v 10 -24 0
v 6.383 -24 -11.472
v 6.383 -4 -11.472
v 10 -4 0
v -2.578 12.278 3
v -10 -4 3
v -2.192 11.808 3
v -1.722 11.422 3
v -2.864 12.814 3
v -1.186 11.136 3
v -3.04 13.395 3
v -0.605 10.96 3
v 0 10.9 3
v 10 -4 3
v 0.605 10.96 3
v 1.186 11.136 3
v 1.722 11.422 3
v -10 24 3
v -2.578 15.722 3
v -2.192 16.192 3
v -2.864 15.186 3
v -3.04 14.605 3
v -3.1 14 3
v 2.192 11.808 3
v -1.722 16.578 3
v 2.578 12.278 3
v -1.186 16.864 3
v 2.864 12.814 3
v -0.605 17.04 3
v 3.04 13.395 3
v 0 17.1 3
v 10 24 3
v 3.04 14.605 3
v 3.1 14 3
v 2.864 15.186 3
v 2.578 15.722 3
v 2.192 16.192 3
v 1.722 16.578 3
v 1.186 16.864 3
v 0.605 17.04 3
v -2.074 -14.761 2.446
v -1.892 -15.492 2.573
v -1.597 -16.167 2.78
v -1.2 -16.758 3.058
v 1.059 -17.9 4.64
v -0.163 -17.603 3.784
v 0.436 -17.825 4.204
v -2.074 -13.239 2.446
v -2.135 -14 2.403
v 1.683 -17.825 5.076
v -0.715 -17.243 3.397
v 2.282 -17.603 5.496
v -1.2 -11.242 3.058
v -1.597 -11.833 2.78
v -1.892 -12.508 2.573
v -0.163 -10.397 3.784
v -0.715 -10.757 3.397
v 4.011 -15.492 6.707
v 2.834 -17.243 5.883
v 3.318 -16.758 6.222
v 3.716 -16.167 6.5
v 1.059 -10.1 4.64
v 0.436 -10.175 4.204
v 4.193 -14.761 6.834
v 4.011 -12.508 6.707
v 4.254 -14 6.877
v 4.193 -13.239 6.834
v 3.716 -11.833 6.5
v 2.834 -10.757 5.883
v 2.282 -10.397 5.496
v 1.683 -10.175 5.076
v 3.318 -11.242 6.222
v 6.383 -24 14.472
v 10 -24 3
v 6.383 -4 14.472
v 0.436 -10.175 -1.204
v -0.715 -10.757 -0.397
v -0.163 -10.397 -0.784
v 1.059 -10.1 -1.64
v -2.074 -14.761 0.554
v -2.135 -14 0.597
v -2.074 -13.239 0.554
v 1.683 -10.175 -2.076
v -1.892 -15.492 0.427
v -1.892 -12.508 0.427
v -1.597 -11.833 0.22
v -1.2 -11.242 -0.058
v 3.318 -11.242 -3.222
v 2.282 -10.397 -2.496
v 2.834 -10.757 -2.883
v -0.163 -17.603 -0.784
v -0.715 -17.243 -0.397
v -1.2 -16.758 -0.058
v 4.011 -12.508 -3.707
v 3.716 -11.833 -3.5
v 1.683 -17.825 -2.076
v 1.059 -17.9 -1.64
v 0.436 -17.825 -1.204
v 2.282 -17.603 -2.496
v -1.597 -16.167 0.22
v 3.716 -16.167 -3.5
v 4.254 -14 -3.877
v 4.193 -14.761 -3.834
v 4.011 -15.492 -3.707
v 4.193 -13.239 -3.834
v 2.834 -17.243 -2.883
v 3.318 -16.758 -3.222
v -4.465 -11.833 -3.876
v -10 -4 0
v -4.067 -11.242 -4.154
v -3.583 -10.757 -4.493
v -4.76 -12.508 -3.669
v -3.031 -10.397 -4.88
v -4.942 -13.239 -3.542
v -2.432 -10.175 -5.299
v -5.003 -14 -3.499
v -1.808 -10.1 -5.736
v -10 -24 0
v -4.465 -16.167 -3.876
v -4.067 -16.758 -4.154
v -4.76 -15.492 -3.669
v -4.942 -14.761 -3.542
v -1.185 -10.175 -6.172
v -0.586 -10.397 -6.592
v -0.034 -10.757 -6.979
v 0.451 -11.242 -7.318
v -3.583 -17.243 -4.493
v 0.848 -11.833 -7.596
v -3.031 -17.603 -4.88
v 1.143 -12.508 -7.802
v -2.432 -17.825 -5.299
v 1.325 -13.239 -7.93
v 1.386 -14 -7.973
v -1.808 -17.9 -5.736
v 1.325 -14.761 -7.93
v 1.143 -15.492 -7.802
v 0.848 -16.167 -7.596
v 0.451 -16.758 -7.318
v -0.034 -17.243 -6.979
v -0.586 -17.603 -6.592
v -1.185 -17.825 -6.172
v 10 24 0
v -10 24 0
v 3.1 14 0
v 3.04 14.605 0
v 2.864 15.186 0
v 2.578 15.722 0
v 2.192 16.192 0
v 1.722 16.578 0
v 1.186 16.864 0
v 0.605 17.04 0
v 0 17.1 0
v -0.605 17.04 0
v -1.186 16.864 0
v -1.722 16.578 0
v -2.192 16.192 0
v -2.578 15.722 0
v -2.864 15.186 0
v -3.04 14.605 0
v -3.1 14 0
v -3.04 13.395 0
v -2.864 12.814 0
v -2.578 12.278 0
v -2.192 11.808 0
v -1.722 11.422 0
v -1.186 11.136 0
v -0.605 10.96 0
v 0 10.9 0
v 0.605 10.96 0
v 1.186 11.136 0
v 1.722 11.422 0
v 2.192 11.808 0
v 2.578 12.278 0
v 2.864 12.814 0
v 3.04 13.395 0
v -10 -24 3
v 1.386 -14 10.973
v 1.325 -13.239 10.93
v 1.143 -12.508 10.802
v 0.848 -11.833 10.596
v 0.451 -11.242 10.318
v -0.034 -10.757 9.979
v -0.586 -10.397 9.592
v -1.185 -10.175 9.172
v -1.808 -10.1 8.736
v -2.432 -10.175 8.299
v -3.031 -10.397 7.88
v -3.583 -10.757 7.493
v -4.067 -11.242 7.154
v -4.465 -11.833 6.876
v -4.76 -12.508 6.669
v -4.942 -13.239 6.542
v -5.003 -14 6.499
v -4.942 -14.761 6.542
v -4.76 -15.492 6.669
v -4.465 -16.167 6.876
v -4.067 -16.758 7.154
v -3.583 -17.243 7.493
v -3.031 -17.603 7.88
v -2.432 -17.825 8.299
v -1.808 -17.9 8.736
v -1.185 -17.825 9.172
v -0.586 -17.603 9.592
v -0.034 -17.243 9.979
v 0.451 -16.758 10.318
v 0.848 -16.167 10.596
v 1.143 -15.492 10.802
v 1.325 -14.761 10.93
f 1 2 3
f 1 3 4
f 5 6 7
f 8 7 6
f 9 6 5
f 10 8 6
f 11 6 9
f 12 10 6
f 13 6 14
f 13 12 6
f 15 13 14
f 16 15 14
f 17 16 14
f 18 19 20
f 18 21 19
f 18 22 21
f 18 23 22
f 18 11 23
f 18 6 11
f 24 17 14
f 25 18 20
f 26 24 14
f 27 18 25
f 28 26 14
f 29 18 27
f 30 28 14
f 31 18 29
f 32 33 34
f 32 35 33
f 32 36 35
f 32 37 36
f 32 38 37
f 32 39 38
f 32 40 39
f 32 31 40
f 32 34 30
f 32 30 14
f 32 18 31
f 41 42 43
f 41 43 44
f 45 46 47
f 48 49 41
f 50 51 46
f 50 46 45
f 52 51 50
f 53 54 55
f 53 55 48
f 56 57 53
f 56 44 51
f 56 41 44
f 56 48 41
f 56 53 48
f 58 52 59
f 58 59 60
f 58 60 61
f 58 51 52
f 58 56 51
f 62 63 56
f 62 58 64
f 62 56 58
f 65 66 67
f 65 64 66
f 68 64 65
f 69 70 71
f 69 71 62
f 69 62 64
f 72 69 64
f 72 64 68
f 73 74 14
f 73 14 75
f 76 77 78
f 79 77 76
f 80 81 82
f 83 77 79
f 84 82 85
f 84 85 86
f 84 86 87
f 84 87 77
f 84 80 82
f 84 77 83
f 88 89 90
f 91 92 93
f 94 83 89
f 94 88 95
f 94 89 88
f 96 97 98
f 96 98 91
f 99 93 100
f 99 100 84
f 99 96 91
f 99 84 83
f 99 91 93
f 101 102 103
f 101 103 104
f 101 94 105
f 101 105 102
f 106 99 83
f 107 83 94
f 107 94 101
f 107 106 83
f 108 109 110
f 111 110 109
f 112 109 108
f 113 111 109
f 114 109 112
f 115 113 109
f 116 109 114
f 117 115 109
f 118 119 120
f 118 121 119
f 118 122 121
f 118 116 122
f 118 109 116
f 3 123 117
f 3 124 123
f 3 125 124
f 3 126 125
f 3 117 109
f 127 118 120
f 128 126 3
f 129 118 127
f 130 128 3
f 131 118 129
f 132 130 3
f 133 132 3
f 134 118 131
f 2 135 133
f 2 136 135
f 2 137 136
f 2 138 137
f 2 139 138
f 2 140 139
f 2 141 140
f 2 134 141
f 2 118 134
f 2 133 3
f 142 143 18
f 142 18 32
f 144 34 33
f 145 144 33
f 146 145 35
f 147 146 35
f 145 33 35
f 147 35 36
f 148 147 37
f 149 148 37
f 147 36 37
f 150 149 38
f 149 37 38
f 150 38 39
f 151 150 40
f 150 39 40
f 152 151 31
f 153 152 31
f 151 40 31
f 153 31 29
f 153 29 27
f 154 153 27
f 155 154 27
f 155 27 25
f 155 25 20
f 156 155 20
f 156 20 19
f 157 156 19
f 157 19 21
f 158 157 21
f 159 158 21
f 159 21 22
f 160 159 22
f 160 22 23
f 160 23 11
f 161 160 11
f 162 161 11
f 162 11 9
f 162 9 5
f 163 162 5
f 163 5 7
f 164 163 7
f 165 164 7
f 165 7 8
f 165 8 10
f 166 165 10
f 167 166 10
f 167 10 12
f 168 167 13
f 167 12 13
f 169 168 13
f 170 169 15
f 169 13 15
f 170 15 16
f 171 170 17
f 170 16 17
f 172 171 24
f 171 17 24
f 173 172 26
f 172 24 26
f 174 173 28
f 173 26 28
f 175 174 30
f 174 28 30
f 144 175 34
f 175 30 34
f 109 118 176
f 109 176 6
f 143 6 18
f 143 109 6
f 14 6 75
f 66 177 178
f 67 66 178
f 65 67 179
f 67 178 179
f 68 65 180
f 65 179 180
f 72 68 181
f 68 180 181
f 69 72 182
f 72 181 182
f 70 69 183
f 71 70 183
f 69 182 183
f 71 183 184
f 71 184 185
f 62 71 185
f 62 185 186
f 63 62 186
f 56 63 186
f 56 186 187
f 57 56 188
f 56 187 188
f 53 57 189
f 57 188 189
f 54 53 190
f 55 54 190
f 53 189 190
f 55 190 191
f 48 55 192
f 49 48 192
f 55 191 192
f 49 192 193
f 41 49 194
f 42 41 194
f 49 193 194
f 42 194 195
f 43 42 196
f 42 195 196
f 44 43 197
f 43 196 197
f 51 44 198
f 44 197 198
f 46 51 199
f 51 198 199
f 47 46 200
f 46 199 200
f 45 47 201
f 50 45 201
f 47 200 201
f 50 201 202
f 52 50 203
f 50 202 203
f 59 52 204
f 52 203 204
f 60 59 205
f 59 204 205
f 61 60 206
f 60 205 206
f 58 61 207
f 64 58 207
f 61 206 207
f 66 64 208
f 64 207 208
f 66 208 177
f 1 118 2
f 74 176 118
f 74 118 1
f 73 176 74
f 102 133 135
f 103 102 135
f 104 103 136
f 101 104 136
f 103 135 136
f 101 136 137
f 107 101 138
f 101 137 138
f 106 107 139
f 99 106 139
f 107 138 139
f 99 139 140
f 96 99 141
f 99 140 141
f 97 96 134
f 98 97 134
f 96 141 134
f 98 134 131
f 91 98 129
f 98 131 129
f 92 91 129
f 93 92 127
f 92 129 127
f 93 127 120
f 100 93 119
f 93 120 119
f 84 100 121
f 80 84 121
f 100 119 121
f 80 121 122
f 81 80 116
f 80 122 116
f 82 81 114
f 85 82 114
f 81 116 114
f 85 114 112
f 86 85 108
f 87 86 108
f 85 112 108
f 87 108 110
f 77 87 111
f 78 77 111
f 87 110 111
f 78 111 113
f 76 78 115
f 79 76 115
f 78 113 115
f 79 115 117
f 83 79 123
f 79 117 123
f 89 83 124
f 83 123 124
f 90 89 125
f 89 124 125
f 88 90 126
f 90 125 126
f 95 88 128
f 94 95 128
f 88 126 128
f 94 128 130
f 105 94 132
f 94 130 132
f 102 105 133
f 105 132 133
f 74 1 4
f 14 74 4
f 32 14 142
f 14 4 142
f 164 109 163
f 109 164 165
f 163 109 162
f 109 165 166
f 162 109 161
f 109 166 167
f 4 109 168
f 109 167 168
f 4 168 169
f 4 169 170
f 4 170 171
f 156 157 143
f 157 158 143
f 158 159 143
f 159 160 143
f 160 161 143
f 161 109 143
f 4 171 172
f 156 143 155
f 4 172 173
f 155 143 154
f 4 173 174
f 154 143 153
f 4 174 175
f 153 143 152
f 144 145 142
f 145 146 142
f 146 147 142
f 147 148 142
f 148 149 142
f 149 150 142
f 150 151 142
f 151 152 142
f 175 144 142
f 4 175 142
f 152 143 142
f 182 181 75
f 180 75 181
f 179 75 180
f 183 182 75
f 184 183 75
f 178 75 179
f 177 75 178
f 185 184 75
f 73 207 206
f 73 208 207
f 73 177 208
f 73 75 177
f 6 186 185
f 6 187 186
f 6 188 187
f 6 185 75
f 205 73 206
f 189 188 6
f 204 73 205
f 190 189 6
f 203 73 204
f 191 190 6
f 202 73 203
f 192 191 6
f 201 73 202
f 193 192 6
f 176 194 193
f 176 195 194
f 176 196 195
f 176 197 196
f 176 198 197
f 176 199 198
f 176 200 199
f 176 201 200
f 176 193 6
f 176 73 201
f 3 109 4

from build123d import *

# Parameters (mm, degrees)
F0_W     = 20
F0_H     = 48
F1_DEPTH = 3
F2_R     = 3.1
F3_DEPTH = 25
F5_DEPTH = 20
F6_R     = 3.9
F7_DEPTH = 5
F8_R     = 3.9
F9_DEPTH = 5


with BuildPart() as f1:
    # F0 (on Top) → F1 (new body)
    with BuildSketch(Plane.XY):
        Rectangle(F0_W, F0_H)
    extrude(amount=F1_DEPTH)

    # F2 (on face) → F3 (cut)
    with BuildSketch(Plane.XY.offset(3)):
        with Locations((0, 14)):
            Circle(F2_R)
    extrude(amount=-F3_DEPTH, mode=Mode.SUBTRACT)

    # F4 (on face) → F5 (join)
    with BuildSketch(Plane.XZ.offset(24)):
        Polygon((6.3830408858, 14.471528727), (-10, 3), (10, 3), align=None)
        Polygon((10, 0), (-10, 0), (6.3830408858, -11.471528727), align=None)
    extrude(amount=-F5_DEPTH)

    # F6 (on face) → F7 (cut)
    with BuildSketch(Plane(origin=(-4.6994382146, 0, 6.7114933189), x_dir=(0.8191520443, 0, 0.5735764364), z_dir=(-0.5735764364, 0, 0.8191520443))):
        with Locations((3.5292088662, -14)):
            Circle(F6_R)
    extrude(amount=-F7_DEPTH, mode=Mode.SUBTRACT)

    # F8 (on face) → F9 (cut)
    with BuildSketch(Plane(origin=(-3.2898992834, 0, -4.6984631039), x_dir=(0.8191520443, 0, -0.5735764364), z_dir=(-0.5735764364, 0, -0.8191520443))):
        with Locations((1.8084795571, 14)):
            Circle(F8_R)
    extrude(amount=-F9_DEPTH, mode=Mode.SUBTRACT)


solid = f1.part
